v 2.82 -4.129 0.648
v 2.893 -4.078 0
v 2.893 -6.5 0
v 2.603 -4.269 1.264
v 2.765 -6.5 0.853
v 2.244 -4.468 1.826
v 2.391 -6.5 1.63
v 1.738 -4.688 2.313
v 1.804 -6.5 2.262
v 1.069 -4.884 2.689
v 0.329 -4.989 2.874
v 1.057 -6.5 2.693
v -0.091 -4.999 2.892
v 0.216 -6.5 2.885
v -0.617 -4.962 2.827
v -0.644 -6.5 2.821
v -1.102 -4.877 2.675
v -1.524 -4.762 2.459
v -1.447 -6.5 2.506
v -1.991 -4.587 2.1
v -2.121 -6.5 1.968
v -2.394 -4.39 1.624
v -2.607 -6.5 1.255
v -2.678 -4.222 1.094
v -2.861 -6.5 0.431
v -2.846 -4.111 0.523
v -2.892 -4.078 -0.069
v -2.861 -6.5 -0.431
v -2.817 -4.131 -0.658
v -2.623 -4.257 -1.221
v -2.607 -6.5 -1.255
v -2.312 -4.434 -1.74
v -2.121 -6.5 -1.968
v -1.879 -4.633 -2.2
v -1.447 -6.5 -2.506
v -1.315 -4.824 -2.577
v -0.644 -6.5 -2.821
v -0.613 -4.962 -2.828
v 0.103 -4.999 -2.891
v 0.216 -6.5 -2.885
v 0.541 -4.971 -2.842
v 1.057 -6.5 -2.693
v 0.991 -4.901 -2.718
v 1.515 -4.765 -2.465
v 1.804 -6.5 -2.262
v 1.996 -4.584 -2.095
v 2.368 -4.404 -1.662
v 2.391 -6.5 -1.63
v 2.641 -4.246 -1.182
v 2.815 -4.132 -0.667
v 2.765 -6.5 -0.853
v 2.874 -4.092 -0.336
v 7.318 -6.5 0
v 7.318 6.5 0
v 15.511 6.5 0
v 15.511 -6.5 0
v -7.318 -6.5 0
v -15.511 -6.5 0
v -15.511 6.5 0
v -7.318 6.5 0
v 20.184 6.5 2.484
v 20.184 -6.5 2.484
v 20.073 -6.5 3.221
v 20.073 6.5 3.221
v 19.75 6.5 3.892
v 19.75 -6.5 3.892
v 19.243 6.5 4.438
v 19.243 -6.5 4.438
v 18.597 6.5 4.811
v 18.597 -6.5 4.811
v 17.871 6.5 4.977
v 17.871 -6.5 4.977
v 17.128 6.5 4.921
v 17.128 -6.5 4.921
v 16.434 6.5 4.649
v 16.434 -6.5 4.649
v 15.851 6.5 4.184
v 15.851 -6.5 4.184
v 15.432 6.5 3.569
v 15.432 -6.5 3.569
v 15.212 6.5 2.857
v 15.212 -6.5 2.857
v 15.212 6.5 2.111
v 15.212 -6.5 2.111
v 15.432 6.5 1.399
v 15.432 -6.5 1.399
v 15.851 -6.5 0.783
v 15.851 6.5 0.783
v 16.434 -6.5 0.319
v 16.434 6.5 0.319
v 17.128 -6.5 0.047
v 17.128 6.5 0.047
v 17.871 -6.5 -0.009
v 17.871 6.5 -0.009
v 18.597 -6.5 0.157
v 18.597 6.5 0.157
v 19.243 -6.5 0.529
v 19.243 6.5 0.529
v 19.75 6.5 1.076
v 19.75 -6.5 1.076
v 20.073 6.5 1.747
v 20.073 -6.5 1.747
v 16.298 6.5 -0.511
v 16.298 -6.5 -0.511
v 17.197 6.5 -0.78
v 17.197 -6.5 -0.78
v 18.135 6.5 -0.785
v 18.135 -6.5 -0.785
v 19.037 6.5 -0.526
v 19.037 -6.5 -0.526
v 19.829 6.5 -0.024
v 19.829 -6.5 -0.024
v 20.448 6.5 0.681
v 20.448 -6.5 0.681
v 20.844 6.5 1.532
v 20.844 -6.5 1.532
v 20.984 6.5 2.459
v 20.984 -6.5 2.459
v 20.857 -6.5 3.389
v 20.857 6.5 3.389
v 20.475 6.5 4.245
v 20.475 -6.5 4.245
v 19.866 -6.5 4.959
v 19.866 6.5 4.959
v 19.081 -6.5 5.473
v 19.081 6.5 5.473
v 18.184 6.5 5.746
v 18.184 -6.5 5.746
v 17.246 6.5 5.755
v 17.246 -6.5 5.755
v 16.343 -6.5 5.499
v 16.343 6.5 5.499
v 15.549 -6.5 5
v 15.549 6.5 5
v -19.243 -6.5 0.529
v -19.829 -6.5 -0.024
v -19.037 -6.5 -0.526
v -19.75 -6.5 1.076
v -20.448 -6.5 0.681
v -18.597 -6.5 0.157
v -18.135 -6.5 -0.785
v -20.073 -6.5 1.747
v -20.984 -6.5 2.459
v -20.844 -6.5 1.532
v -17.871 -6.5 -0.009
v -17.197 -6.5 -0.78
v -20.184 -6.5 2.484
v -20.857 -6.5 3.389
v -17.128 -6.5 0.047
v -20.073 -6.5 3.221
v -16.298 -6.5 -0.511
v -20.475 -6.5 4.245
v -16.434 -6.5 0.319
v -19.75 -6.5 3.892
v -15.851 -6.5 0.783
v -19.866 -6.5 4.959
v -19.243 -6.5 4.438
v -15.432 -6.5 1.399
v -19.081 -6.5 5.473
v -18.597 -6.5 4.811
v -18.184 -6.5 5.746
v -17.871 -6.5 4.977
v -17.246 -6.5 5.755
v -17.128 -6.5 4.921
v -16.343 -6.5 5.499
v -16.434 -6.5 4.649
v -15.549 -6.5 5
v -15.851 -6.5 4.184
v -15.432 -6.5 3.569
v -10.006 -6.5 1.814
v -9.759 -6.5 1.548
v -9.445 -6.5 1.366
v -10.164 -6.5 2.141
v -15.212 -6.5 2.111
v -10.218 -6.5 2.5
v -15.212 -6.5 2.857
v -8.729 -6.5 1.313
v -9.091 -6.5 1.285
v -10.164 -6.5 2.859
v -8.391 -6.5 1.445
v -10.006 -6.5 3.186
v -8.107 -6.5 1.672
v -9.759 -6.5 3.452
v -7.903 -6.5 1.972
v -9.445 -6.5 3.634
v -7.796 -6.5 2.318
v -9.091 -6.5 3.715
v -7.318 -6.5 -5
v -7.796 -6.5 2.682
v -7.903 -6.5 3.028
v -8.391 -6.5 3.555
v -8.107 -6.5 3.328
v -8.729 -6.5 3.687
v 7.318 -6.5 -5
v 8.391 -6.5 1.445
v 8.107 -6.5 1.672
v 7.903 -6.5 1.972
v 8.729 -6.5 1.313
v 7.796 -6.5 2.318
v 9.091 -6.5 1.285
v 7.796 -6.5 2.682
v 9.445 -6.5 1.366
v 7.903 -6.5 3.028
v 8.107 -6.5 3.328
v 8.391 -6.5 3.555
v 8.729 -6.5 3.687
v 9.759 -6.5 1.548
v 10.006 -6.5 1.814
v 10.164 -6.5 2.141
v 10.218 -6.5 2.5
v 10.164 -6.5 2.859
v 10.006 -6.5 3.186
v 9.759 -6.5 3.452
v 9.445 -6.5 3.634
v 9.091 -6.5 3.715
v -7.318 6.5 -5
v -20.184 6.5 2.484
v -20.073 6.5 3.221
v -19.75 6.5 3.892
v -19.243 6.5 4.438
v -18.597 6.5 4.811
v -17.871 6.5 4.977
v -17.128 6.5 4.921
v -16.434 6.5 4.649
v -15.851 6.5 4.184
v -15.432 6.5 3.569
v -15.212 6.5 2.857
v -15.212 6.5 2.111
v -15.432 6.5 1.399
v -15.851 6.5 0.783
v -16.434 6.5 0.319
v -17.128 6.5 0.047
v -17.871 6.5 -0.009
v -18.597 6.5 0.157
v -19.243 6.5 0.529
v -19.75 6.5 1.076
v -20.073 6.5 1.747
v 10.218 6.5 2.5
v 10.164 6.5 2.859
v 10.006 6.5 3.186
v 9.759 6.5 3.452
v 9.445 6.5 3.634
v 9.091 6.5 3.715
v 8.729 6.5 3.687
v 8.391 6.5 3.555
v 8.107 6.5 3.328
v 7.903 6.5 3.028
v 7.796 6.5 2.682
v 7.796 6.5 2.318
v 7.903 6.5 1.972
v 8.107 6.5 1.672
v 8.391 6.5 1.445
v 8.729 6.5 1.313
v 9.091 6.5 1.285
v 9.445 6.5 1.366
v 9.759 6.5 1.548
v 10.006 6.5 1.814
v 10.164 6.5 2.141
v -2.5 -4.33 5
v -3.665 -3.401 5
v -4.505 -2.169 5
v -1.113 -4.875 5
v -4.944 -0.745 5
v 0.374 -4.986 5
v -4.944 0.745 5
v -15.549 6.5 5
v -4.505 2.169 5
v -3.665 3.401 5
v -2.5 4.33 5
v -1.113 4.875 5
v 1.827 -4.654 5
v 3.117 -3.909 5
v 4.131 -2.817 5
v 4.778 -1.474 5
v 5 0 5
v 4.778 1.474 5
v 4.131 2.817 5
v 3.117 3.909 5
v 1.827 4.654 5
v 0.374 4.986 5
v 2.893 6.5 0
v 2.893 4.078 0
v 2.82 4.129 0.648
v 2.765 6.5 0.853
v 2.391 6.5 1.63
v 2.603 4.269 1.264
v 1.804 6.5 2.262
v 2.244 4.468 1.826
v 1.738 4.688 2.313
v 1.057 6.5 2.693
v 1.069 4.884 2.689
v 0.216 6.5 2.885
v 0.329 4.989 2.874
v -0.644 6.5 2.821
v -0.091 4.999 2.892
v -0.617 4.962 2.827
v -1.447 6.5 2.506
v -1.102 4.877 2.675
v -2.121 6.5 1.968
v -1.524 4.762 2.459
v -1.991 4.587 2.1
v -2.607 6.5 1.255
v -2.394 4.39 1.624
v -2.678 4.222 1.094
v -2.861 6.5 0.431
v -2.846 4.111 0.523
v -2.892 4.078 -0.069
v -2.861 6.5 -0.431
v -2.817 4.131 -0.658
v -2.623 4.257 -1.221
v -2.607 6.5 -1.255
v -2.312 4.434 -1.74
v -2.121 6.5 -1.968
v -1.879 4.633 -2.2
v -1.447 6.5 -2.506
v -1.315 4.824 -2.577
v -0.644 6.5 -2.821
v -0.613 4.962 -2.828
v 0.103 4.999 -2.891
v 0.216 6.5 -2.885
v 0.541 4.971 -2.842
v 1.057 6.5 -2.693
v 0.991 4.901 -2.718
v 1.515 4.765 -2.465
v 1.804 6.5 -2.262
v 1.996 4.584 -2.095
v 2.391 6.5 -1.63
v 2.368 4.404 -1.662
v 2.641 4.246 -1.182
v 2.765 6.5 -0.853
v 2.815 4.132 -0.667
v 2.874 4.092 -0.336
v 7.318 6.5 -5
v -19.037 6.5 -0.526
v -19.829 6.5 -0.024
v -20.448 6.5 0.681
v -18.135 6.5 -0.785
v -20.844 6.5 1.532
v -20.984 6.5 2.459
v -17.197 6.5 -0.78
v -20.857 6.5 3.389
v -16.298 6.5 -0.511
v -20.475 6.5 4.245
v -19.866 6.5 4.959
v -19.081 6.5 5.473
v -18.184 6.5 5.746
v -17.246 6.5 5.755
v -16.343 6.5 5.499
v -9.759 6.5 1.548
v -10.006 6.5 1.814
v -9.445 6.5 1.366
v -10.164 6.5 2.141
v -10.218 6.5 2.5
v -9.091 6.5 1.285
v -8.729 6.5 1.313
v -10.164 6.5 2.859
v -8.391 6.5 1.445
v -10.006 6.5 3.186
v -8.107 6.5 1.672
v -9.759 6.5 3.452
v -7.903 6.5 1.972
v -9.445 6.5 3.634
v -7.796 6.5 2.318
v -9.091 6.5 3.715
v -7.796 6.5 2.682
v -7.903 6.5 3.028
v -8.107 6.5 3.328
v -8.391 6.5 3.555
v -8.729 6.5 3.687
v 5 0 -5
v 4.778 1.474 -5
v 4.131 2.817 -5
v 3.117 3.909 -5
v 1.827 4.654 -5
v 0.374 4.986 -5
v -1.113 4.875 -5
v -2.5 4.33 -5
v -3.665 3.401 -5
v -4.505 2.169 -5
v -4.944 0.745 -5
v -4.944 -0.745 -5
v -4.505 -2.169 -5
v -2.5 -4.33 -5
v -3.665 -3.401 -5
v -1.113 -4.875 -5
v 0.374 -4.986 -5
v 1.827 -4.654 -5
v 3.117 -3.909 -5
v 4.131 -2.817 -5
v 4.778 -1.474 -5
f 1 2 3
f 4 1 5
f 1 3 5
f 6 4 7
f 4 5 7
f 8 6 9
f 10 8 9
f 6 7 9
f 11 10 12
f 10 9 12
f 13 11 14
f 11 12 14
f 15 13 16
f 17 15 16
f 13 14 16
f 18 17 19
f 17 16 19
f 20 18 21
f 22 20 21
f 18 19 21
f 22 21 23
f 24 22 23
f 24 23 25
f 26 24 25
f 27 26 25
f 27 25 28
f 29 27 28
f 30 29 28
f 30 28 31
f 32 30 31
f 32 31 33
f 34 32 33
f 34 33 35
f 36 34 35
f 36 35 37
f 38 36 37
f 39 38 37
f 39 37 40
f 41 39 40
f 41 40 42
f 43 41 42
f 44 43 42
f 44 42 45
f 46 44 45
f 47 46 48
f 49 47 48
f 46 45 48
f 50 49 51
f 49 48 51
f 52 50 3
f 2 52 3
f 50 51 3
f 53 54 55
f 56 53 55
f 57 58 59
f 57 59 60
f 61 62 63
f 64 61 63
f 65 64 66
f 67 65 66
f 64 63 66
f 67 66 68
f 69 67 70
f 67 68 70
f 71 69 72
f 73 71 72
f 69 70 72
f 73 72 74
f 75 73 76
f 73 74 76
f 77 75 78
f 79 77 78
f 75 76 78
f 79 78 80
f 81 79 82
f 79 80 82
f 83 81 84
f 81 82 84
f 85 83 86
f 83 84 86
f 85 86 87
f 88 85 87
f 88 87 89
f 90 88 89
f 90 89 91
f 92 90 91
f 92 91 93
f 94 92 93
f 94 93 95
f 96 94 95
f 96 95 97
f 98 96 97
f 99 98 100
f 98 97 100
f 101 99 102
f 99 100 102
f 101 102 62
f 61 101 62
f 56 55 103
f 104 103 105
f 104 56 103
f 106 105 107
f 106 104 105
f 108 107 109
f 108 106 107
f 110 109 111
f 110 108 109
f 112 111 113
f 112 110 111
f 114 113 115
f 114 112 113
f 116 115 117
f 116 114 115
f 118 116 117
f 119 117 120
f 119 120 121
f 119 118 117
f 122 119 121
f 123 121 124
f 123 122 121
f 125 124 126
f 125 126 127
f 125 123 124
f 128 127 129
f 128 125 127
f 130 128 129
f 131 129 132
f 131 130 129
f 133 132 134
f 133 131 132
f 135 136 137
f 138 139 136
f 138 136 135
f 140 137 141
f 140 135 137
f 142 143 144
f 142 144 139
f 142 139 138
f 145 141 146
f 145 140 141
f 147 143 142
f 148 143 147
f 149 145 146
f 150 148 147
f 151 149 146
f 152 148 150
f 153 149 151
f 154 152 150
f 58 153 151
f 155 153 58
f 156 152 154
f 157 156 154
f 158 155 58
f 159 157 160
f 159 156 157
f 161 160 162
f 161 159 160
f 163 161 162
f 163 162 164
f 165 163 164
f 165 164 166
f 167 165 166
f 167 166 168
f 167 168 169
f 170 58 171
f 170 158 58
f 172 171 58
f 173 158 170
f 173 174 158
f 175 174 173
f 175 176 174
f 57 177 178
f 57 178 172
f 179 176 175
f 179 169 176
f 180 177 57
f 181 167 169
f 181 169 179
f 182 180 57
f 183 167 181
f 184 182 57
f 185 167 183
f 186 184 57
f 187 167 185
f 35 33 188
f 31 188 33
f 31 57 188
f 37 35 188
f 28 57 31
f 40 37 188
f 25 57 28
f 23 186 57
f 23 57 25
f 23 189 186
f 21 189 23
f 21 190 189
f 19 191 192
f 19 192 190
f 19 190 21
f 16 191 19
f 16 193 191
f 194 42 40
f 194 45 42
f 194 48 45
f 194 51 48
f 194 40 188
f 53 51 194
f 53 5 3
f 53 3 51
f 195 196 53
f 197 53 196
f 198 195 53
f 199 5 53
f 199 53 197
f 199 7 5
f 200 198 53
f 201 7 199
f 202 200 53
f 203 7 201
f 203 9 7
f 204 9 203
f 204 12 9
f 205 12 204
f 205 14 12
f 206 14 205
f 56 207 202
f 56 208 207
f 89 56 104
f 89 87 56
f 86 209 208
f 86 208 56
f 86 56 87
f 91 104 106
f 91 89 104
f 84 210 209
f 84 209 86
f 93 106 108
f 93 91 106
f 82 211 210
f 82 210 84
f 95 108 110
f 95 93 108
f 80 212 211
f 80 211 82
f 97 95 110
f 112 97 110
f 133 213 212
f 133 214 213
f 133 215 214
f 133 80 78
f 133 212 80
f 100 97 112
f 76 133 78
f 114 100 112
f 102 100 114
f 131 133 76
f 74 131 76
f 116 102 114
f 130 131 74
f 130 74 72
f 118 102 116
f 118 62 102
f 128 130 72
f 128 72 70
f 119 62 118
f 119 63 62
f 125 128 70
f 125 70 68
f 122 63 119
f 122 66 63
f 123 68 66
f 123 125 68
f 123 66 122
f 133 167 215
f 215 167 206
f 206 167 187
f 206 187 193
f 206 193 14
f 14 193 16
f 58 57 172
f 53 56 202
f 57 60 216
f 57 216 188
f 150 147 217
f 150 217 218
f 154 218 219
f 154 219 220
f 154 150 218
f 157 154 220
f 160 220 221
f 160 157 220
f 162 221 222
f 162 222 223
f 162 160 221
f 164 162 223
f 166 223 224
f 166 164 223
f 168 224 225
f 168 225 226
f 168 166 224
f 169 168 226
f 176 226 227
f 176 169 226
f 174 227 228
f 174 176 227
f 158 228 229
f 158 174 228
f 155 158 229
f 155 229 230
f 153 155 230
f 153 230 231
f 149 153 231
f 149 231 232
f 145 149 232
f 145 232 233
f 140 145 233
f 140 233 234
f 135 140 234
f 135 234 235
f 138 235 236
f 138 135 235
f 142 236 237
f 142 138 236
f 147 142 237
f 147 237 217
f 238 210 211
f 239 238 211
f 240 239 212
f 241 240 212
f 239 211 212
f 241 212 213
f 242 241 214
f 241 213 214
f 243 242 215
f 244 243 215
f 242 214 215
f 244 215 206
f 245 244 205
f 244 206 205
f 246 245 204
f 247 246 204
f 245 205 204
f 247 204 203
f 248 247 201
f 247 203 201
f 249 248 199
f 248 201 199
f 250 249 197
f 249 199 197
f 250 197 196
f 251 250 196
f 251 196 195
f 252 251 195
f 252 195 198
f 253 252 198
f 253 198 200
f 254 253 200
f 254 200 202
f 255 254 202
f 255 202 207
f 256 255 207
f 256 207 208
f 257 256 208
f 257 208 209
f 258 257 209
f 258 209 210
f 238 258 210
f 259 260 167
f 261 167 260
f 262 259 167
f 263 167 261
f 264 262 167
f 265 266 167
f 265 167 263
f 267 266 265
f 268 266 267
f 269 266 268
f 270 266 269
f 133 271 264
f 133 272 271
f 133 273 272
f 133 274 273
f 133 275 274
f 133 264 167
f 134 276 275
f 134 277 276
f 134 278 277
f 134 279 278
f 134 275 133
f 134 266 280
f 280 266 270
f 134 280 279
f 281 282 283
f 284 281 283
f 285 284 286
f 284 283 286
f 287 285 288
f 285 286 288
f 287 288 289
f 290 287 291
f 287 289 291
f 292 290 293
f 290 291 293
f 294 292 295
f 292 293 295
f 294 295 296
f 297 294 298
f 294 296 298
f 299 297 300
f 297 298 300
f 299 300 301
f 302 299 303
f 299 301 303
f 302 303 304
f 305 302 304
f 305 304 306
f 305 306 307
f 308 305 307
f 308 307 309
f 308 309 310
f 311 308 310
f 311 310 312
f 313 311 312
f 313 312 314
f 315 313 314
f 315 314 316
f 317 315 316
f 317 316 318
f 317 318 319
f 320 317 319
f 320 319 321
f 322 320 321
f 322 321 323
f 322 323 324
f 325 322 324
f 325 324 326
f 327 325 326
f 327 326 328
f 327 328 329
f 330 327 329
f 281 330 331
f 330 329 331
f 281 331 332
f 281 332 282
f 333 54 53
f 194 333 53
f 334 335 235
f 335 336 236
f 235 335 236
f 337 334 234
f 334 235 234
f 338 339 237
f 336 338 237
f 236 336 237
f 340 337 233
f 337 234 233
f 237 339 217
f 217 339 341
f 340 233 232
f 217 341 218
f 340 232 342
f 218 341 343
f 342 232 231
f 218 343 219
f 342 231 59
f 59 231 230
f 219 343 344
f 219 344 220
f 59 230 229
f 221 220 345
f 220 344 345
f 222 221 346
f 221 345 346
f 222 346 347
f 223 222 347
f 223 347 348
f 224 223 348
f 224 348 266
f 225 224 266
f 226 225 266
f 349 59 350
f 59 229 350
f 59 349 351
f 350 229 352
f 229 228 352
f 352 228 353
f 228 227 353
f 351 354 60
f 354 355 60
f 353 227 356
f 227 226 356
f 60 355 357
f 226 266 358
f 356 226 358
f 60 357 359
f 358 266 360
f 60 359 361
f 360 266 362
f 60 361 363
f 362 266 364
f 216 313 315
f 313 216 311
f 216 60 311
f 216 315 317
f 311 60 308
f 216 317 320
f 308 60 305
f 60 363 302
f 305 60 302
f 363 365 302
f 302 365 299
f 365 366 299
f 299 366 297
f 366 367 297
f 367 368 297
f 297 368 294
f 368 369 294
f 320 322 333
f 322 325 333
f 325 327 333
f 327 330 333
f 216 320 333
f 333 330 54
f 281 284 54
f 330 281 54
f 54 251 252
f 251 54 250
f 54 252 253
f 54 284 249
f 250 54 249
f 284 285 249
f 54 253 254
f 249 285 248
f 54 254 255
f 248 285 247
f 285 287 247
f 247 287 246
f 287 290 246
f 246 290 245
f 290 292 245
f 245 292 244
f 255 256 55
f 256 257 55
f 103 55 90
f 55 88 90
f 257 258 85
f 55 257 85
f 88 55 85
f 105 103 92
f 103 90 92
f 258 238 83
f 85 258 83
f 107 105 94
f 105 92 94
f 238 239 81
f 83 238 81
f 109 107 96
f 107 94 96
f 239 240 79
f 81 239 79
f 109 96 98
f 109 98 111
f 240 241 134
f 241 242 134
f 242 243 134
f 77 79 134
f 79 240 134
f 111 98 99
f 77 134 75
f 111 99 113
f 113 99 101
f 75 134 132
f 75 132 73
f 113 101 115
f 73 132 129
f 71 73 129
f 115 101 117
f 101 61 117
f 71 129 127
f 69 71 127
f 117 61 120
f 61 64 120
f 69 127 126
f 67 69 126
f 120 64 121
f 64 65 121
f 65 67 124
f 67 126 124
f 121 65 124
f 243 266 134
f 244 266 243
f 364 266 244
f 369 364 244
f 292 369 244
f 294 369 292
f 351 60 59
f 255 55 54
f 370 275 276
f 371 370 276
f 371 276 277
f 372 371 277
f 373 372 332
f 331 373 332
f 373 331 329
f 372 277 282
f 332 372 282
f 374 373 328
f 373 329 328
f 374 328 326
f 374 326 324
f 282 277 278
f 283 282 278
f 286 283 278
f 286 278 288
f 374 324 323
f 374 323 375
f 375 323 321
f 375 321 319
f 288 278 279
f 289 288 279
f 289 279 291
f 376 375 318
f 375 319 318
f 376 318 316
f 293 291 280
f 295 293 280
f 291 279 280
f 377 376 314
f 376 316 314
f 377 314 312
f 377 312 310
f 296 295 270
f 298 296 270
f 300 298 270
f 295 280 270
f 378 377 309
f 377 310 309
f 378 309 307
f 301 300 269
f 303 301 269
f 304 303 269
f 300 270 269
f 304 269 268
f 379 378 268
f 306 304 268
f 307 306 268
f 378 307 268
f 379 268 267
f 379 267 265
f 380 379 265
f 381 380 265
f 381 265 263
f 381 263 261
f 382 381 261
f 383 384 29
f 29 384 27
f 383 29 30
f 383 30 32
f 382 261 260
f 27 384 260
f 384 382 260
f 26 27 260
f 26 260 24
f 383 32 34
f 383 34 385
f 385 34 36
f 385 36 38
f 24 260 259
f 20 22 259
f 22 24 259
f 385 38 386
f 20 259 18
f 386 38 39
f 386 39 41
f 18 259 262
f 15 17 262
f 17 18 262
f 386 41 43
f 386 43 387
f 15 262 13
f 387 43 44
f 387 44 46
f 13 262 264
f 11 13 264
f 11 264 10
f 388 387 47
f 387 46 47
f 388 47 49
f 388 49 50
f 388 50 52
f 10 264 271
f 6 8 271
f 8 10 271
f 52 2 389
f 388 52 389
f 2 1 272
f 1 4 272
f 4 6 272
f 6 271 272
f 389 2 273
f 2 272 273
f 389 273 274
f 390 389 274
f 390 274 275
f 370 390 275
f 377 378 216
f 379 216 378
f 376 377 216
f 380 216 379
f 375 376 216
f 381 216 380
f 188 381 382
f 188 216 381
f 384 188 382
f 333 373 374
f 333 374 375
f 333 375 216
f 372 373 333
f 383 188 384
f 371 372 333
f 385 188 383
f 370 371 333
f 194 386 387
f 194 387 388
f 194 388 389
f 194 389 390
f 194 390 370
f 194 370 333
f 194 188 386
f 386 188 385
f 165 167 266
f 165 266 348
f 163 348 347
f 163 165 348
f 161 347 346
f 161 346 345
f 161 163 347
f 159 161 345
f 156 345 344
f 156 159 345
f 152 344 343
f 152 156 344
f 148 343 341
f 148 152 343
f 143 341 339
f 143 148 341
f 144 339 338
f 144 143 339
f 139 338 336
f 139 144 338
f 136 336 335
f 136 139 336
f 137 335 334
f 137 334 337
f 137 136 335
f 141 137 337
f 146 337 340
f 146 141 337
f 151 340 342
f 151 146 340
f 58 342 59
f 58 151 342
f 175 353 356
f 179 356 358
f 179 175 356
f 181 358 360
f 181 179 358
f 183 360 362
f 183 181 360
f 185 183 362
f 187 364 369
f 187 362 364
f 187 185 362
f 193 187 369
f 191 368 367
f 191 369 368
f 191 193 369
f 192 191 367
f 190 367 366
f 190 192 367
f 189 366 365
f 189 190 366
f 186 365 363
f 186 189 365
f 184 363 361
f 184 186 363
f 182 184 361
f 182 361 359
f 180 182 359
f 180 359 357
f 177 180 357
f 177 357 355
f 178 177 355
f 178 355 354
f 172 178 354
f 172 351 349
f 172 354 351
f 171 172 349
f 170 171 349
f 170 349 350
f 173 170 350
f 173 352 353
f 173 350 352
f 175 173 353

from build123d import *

# Parameters (mm, degrees)
SKETCH002_R     = 2.5
PAD002_DEPTH    = 13
SKETCH_W        = 35
SKETCH_H        = 13
PAD_DEPTH       = 5
SKETCH003_R     = 3.3
PAD003_DEPTH    = 13
SKETCH005_W     = 14.63643
SKETCH005_H     = 13
PAD004_DEPTH    = 5
SKETCH004_R     = 5
POCKET_DEPTH    = 10.001
SKETCH006_R     = 2.893254
POCKET001_DEPTH = 13.001
SKETCH007_R     = 1.218023
POCKET002_DEPTH = 103.479644


with BuildPart() as pad002:
    # Sketch002 → Pad002 (new body)
    with BuildSketch(Plane.XZ.offset(6.5)):
        with Locations((17.683945, 2.483897)):
            Circle(SKETCH002_R)
    extrude(amount=-PAD002_DEPTH)


with BuildPart() as part_mirroring001:
    # Part__Mirroring001: instance of Pad002
    add(pad002.part.mirror(Plane(origin=(0, 0, 2.483897), x_dir=(0, -1, 0), z_dir=(1, 0, 0))))


with BuildPart() as scassi:
    # Fusion001 base: copy of Pad002
    add(pad002.part)

    # Fusion001: union Part__Mirroring001
    add(part_mirroring001.part)


with BuildPart() as cut:
    # Sketch → Pad (new body)
    with BuildSketch(Plane.XY):
        Rectangle(SKETCH_W, SKETCH_H)
    extrude(amount=PAD_DEPTH)

    # Sketch003 → Pad003 (new body)
    with BuildSketch(Plane.XZ.offset(6.5)):
        with Locations((17.683945, 2.483897)):
            Circle(SKETCH003_R)
        with Locations((-17.683945, 2.483897)):
            Circle(SKETCH003_R)
    extrude(amount=-PAD003_DEPTH)

    # Cut: cut scassi
    add(scassi.part, mode=Mode.SUBTRACT)


with BuildPart() as multitransform:
    # Sketch005 → Pad004 (new body)
    with BuildSketch(Plane(origin=(0, 0, 0), x_dir=(1, 0, 0), z_dir=(0, 0, -1))):
        Rectangle(SKETCH005_W, SKETCH005_H)
    extrude(amount=PAD004_DEPTH)

    # Fusion002: union Cut
    add(cut.part)

    # Sketch004 → Pocket (cut, through all)
    with BuildSketch(Plane.XY.offset(5)):
        Circle(SKETCH004_R)
    extrude(amount=-POCKET_DEPTH, mode=Mode.SUBTRACT)

    # Sketch006 → Pocket001 (cut, through all)
    with BuildSketch(Plane.XZ.offset(6.5)):
        Circle(SKETCH006_R)
    extrude(amount=-POCKET001_DEPTH, mode=Mode.SUBTRACT)

    # Sketch007 → Pocket002 (cut, through all)
    with BuildSketch(Plane.XZ.offset(6.5)):
        with Locations((9, 2.5)):
            Circle(SKETCH007_R)
    pocket002 = extrude(amount=-POCKET002_DEPTH, mode=Mode.SUBTRACT)

    # Mirrored: Pocket002 across Sketch007 V_Axis
    add(pocket002.mirror(Plane(origin=(0, -6.5, 0), x_dir=(0, -1, 0), z_dir=(1, 0, 0))), mode=Mode.SUBTRACT)


solid = multitransform.part
